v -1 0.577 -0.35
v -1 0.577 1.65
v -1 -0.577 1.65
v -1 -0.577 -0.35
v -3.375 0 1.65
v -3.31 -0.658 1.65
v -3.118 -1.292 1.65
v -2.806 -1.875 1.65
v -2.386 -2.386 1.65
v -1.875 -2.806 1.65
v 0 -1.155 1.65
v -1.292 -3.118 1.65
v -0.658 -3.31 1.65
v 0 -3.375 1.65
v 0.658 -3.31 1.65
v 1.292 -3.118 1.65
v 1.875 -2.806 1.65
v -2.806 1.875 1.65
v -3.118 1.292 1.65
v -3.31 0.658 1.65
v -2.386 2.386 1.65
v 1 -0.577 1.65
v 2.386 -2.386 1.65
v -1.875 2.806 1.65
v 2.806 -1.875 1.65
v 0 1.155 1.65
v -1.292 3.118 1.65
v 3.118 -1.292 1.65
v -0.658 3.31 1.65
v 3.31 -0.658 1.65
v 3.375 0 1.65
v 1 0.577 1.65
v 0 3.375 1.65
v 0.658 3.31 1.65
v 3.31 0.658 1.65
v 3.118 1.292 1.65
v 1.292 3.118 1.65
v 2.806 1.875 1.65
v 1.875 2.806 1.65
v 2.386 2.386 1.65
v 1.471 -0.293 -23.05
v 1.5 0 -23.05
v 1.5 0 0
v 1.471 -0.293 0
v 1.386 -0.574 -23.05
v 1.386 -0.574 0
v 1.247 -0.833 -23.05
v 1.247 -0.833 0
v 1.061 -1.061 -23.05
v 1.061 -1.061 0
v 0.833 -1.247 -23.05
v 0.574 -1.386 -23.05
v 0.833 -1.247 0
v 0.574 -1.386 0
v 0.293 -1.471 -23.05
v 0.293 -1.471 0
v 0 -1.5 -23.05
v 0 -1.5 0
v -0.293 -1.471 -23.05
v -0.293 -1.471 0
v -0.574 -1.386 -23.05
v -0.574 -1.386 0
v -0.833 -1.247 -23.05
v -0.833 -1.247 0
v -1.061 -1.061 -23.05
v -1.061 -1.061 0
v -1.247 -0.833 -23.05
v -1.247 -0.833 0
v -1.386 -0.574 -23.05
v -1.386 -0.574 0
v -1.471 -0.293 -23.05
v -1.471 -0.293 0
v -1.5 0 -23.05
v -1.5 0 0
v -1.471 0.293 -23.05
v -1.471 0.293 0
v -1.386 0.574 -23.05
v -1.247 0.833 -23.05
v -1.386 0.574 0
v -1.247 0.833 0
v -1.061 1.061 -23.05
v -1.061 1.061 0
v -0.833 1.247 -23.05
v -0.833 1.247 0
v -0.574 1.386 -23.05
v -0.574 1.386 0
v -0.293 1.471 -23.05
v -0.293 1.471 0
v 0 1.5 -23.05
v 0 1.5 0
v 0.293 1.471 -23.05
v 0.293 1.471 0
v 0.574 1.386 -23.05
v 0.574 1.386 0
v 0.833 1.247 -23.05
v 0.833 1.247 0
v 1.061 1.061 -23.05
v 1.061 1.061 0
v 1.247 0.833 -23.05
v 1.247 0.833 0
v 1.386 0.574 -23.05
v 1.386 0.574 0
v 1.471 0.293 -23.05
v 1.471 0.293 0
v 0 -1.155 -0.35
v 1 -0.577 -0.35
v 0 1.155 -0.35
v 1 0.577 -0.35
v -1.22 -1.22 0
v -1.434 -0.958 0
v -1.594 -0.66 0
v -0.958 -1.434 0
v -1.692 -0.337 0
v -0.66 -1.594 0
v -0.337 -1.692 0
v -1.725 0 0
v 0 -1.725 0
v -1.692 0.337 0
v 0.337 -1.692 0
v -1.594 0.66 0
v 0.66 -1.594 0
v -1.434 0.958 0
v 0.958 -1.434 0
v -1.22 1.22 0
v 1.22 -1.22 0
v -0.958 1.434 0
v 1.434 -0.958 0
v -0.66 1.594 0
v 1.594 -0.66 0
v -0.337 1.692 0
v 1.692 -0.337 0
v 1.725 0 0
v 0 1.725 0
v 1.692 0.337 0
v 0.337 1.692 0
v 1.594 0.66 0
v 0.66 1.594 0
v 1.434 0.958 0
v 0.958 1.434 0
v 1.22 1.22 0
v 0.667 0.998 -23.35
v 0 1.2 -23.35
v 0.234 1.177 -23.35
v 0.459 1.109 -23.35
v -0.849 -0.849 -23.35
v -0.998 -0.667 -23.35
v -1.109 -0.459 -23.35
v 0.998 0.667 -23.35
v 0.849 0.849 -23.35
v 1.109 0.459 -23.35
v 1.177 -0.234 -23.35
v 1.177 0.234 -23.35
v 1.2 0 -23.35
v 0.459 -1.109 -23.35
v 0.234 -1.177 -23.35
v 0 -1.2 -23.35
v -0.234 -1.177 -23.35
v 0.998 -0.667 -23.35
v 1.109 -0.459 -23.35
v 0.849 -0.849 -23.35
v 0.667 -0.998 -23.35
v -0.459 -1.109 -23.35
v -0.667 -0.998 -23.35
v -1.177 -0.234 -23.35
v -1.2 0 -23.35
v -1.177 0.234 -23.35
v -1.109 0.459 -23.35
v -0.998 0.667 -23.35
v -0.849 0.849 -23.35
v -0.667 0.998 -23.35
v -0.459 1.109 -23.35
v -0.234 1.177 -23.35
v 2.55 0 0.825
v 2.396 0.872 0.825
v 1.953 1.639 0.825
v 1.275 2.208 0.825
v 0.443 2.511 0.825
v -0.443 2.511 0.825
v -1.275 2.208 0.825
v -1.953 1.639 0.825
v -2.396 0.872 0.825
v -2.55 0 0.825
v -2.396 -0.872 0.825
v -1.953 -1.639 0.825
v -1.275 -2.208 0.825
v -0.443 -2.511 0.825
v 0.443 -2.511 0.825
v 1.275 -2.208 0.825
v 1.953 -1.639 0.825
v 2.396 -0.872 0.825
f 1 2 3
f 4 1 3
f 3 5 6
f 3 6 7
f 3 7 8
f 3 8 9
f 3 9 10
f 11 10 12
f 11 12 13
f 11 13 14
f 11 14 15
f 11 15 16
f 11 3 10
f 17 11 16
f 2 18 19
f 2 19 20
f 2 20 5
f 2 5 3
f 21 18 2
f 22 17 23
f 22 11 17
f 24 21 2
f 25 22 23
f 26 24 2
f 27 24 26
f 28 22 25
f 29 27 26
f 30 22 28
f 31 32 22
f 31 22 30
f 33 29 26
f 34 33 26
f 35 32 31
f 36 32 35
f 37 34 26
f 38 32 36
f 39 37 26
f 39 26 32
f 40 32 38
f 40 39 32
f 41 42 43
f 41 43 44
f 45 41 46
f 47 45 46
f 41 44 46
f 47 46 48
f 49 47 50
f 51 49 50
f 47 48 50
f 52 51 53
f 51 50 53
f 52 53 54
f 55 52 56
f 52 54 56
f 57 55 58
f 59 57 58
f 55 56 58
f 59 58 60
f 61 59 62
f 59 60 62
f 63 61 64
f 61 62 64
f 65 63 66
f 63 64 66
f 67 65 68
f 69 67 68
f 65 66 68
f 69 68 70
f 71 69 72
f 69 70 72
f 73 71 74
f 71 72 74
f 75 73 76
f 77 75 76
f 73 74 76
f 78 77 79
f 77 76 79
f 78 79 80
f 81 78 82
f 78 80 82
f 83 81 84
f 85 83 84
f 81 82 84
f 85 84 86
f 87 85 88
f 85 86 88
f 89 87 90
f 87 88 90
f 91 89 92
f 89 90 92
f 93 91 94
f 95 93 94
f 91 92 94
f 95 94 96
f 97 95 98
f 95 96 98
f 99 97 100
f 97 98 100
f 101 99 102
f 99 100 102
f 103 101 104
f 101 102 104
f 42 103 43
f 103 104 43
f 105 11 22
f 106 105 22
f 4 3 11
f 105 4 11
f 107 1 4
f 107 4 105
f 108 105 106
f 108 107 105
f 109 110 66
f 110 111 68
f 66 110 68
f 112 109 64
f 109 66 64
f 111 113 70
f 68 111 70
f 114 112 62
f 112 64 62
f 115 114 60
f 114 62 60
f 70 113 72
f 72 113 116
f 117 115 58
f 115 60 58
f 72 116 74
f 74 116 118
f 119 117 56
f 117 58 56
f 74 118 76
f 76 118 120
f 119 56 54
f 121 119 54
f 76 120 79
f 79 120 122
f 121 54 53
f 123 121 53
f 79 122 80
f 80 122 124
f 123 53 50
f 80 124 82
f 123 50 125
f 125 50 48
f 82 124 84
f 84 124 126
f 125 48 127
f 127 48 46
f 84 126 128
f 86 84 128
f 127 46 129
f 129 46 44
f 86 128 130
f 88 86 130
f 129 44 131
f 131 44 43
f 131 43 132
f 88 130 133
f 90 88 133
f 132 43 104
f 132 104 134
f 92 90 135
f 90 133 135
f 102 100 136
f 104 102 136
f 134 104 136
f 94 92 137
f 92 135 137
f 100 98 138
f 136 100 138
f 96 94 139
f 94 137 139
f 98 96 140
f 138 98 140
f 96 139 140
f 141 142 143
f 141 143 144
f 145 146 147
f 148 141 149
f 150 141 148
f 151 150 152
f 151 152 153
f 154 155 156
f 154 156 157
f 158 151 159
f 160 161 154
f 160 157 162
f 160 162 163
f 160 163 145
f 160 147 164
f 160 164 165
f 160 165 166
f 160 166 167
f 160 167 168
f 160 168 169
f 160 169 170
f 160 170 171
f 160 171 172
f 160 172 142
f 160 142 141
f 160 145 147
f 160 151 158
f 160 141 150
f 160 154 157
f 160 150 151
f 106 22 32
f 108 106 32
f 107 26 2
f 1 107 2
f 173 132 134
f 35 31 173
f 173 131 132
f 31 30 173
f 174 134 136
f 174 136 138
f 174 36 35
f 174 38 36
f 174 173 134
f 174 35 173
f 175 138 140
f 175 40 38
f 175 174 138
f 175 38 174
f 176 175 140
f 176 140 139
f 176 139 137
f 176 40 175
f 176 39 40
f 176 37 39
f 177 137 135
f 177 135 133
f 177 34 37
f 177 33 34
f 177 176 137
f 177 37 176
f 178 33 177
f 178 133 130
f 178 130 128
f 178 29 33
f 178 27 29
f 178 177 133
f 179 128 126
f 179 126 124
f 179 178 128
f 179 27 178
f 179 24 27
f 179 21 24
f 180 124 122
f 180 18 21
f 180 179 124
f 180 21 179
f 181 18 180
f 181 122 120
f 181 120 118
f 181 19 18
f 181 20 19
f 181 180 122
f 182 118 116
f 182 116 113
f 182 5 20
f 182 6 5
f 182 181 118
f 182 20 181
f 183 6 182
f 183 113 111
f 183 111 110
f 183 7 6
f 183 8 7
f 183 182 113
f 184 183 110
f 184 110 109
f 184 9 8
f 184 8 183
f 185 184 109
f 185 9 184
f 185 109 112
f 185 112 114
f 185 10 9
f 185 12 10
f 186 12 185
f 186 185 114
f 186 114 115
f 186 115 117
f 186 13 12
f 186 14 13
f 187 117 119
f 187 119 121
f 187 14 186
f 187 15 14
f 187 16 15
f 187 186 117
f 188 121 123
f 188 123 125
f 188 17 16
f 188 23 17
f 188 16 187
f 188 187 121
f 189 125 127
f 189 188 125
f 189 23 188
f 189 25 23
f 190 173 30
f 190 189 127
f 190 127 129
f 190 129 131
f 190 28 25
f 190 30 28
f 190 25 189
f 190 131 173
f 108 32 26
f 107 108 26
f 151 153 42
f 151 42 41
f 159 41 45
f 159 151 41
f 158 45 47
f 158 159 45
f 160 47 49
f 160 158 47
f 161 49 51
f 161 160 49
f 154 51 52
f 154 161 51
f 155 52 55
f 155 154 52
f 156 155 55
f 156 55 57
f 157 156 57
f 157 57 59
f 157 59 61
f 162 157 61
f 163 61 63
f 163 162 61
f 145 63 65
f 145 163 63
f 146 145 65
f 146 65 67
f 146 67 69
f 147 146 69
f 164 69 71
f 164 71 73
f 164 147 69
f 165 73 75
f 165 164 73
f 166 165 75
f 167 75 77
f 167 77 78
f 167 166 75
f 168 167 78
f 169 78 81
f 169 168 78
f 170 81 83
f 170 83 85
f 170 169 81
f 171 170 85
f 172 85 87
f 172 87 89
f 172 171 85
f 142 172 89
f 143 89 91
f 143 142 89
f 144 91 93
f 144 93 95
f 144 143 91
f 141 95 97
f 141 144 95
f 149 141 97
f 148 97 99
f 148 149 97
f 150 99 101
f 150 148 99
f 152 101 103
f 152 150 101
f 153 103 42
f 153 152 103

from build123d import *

# Parameters (mm, degrees)
SKETCH1_R           = 3.375
BOSS_EXTRUDE1_DEPTH = 1.65
SKETCH2_R           = 1.5
BOSS_EXTRUDE2_DEPTH = 23.35
CHAMFER1_SIZE       = 0.3
CUT_EXTRUDE1_DEPTH  = 2
CHAMFER2_SIZE       = 1.65


with BuildPart() as part:
    # Sketch1 → Boss-Extrude1 (new body)
    with BuildSketch(Plane.XY):
        Circle(SKETCH1_R)
    extrude(amount=BOSS_EXTRUDE1_DEPTH)

    # Sketch2 → Boss-Extrude2 (add)
    with BuildSketch(Plane(origin=(0, 0, 0), x_dir=(-1, 0, 0), z_dir=(0, 0, -1))):
        with Locations(Location((0, 0, 0), (0, 0, 180))):
            Circle(SKETCH2_R)
    extrude(amount=BOSS_EXTRUDE2_DEPTH)

    # Chamfer1
    chamfer1_edges = [part.edges().sort_by_distance(p)[0] for p in [
        (-1.5, 0, -23.35),
    ]]
    chamfer(chamfer1_edges, length=CHAMFER1_SIZE)

    # Sketch3 → Cut-Extrude1 (cut)
    with BuildSketch(Plane.XY.offset(1.65)):
        Polygon((0, 1.154700538), (-1, 0.577350269), (-1, -0.577350269), (0, -1.154700538), (1, -0.577350269), (1, 0.577350269), align=None)
    extrude(amount=-CUT_EXTRUDE1_DEPTH, mode=Mode.SUBTRACT)

    # Chamfer2
    chamfer2_edges = [part.edges().sort_by_distance(p)[0] for p in [
        (-3.375, 0, 0),
    ]]
    chamfer(chamfer2_edges, length=CHAMFER2_SIZE - 0.0001)  # a hair under: the kernel refuses the full size


solid = part.part
